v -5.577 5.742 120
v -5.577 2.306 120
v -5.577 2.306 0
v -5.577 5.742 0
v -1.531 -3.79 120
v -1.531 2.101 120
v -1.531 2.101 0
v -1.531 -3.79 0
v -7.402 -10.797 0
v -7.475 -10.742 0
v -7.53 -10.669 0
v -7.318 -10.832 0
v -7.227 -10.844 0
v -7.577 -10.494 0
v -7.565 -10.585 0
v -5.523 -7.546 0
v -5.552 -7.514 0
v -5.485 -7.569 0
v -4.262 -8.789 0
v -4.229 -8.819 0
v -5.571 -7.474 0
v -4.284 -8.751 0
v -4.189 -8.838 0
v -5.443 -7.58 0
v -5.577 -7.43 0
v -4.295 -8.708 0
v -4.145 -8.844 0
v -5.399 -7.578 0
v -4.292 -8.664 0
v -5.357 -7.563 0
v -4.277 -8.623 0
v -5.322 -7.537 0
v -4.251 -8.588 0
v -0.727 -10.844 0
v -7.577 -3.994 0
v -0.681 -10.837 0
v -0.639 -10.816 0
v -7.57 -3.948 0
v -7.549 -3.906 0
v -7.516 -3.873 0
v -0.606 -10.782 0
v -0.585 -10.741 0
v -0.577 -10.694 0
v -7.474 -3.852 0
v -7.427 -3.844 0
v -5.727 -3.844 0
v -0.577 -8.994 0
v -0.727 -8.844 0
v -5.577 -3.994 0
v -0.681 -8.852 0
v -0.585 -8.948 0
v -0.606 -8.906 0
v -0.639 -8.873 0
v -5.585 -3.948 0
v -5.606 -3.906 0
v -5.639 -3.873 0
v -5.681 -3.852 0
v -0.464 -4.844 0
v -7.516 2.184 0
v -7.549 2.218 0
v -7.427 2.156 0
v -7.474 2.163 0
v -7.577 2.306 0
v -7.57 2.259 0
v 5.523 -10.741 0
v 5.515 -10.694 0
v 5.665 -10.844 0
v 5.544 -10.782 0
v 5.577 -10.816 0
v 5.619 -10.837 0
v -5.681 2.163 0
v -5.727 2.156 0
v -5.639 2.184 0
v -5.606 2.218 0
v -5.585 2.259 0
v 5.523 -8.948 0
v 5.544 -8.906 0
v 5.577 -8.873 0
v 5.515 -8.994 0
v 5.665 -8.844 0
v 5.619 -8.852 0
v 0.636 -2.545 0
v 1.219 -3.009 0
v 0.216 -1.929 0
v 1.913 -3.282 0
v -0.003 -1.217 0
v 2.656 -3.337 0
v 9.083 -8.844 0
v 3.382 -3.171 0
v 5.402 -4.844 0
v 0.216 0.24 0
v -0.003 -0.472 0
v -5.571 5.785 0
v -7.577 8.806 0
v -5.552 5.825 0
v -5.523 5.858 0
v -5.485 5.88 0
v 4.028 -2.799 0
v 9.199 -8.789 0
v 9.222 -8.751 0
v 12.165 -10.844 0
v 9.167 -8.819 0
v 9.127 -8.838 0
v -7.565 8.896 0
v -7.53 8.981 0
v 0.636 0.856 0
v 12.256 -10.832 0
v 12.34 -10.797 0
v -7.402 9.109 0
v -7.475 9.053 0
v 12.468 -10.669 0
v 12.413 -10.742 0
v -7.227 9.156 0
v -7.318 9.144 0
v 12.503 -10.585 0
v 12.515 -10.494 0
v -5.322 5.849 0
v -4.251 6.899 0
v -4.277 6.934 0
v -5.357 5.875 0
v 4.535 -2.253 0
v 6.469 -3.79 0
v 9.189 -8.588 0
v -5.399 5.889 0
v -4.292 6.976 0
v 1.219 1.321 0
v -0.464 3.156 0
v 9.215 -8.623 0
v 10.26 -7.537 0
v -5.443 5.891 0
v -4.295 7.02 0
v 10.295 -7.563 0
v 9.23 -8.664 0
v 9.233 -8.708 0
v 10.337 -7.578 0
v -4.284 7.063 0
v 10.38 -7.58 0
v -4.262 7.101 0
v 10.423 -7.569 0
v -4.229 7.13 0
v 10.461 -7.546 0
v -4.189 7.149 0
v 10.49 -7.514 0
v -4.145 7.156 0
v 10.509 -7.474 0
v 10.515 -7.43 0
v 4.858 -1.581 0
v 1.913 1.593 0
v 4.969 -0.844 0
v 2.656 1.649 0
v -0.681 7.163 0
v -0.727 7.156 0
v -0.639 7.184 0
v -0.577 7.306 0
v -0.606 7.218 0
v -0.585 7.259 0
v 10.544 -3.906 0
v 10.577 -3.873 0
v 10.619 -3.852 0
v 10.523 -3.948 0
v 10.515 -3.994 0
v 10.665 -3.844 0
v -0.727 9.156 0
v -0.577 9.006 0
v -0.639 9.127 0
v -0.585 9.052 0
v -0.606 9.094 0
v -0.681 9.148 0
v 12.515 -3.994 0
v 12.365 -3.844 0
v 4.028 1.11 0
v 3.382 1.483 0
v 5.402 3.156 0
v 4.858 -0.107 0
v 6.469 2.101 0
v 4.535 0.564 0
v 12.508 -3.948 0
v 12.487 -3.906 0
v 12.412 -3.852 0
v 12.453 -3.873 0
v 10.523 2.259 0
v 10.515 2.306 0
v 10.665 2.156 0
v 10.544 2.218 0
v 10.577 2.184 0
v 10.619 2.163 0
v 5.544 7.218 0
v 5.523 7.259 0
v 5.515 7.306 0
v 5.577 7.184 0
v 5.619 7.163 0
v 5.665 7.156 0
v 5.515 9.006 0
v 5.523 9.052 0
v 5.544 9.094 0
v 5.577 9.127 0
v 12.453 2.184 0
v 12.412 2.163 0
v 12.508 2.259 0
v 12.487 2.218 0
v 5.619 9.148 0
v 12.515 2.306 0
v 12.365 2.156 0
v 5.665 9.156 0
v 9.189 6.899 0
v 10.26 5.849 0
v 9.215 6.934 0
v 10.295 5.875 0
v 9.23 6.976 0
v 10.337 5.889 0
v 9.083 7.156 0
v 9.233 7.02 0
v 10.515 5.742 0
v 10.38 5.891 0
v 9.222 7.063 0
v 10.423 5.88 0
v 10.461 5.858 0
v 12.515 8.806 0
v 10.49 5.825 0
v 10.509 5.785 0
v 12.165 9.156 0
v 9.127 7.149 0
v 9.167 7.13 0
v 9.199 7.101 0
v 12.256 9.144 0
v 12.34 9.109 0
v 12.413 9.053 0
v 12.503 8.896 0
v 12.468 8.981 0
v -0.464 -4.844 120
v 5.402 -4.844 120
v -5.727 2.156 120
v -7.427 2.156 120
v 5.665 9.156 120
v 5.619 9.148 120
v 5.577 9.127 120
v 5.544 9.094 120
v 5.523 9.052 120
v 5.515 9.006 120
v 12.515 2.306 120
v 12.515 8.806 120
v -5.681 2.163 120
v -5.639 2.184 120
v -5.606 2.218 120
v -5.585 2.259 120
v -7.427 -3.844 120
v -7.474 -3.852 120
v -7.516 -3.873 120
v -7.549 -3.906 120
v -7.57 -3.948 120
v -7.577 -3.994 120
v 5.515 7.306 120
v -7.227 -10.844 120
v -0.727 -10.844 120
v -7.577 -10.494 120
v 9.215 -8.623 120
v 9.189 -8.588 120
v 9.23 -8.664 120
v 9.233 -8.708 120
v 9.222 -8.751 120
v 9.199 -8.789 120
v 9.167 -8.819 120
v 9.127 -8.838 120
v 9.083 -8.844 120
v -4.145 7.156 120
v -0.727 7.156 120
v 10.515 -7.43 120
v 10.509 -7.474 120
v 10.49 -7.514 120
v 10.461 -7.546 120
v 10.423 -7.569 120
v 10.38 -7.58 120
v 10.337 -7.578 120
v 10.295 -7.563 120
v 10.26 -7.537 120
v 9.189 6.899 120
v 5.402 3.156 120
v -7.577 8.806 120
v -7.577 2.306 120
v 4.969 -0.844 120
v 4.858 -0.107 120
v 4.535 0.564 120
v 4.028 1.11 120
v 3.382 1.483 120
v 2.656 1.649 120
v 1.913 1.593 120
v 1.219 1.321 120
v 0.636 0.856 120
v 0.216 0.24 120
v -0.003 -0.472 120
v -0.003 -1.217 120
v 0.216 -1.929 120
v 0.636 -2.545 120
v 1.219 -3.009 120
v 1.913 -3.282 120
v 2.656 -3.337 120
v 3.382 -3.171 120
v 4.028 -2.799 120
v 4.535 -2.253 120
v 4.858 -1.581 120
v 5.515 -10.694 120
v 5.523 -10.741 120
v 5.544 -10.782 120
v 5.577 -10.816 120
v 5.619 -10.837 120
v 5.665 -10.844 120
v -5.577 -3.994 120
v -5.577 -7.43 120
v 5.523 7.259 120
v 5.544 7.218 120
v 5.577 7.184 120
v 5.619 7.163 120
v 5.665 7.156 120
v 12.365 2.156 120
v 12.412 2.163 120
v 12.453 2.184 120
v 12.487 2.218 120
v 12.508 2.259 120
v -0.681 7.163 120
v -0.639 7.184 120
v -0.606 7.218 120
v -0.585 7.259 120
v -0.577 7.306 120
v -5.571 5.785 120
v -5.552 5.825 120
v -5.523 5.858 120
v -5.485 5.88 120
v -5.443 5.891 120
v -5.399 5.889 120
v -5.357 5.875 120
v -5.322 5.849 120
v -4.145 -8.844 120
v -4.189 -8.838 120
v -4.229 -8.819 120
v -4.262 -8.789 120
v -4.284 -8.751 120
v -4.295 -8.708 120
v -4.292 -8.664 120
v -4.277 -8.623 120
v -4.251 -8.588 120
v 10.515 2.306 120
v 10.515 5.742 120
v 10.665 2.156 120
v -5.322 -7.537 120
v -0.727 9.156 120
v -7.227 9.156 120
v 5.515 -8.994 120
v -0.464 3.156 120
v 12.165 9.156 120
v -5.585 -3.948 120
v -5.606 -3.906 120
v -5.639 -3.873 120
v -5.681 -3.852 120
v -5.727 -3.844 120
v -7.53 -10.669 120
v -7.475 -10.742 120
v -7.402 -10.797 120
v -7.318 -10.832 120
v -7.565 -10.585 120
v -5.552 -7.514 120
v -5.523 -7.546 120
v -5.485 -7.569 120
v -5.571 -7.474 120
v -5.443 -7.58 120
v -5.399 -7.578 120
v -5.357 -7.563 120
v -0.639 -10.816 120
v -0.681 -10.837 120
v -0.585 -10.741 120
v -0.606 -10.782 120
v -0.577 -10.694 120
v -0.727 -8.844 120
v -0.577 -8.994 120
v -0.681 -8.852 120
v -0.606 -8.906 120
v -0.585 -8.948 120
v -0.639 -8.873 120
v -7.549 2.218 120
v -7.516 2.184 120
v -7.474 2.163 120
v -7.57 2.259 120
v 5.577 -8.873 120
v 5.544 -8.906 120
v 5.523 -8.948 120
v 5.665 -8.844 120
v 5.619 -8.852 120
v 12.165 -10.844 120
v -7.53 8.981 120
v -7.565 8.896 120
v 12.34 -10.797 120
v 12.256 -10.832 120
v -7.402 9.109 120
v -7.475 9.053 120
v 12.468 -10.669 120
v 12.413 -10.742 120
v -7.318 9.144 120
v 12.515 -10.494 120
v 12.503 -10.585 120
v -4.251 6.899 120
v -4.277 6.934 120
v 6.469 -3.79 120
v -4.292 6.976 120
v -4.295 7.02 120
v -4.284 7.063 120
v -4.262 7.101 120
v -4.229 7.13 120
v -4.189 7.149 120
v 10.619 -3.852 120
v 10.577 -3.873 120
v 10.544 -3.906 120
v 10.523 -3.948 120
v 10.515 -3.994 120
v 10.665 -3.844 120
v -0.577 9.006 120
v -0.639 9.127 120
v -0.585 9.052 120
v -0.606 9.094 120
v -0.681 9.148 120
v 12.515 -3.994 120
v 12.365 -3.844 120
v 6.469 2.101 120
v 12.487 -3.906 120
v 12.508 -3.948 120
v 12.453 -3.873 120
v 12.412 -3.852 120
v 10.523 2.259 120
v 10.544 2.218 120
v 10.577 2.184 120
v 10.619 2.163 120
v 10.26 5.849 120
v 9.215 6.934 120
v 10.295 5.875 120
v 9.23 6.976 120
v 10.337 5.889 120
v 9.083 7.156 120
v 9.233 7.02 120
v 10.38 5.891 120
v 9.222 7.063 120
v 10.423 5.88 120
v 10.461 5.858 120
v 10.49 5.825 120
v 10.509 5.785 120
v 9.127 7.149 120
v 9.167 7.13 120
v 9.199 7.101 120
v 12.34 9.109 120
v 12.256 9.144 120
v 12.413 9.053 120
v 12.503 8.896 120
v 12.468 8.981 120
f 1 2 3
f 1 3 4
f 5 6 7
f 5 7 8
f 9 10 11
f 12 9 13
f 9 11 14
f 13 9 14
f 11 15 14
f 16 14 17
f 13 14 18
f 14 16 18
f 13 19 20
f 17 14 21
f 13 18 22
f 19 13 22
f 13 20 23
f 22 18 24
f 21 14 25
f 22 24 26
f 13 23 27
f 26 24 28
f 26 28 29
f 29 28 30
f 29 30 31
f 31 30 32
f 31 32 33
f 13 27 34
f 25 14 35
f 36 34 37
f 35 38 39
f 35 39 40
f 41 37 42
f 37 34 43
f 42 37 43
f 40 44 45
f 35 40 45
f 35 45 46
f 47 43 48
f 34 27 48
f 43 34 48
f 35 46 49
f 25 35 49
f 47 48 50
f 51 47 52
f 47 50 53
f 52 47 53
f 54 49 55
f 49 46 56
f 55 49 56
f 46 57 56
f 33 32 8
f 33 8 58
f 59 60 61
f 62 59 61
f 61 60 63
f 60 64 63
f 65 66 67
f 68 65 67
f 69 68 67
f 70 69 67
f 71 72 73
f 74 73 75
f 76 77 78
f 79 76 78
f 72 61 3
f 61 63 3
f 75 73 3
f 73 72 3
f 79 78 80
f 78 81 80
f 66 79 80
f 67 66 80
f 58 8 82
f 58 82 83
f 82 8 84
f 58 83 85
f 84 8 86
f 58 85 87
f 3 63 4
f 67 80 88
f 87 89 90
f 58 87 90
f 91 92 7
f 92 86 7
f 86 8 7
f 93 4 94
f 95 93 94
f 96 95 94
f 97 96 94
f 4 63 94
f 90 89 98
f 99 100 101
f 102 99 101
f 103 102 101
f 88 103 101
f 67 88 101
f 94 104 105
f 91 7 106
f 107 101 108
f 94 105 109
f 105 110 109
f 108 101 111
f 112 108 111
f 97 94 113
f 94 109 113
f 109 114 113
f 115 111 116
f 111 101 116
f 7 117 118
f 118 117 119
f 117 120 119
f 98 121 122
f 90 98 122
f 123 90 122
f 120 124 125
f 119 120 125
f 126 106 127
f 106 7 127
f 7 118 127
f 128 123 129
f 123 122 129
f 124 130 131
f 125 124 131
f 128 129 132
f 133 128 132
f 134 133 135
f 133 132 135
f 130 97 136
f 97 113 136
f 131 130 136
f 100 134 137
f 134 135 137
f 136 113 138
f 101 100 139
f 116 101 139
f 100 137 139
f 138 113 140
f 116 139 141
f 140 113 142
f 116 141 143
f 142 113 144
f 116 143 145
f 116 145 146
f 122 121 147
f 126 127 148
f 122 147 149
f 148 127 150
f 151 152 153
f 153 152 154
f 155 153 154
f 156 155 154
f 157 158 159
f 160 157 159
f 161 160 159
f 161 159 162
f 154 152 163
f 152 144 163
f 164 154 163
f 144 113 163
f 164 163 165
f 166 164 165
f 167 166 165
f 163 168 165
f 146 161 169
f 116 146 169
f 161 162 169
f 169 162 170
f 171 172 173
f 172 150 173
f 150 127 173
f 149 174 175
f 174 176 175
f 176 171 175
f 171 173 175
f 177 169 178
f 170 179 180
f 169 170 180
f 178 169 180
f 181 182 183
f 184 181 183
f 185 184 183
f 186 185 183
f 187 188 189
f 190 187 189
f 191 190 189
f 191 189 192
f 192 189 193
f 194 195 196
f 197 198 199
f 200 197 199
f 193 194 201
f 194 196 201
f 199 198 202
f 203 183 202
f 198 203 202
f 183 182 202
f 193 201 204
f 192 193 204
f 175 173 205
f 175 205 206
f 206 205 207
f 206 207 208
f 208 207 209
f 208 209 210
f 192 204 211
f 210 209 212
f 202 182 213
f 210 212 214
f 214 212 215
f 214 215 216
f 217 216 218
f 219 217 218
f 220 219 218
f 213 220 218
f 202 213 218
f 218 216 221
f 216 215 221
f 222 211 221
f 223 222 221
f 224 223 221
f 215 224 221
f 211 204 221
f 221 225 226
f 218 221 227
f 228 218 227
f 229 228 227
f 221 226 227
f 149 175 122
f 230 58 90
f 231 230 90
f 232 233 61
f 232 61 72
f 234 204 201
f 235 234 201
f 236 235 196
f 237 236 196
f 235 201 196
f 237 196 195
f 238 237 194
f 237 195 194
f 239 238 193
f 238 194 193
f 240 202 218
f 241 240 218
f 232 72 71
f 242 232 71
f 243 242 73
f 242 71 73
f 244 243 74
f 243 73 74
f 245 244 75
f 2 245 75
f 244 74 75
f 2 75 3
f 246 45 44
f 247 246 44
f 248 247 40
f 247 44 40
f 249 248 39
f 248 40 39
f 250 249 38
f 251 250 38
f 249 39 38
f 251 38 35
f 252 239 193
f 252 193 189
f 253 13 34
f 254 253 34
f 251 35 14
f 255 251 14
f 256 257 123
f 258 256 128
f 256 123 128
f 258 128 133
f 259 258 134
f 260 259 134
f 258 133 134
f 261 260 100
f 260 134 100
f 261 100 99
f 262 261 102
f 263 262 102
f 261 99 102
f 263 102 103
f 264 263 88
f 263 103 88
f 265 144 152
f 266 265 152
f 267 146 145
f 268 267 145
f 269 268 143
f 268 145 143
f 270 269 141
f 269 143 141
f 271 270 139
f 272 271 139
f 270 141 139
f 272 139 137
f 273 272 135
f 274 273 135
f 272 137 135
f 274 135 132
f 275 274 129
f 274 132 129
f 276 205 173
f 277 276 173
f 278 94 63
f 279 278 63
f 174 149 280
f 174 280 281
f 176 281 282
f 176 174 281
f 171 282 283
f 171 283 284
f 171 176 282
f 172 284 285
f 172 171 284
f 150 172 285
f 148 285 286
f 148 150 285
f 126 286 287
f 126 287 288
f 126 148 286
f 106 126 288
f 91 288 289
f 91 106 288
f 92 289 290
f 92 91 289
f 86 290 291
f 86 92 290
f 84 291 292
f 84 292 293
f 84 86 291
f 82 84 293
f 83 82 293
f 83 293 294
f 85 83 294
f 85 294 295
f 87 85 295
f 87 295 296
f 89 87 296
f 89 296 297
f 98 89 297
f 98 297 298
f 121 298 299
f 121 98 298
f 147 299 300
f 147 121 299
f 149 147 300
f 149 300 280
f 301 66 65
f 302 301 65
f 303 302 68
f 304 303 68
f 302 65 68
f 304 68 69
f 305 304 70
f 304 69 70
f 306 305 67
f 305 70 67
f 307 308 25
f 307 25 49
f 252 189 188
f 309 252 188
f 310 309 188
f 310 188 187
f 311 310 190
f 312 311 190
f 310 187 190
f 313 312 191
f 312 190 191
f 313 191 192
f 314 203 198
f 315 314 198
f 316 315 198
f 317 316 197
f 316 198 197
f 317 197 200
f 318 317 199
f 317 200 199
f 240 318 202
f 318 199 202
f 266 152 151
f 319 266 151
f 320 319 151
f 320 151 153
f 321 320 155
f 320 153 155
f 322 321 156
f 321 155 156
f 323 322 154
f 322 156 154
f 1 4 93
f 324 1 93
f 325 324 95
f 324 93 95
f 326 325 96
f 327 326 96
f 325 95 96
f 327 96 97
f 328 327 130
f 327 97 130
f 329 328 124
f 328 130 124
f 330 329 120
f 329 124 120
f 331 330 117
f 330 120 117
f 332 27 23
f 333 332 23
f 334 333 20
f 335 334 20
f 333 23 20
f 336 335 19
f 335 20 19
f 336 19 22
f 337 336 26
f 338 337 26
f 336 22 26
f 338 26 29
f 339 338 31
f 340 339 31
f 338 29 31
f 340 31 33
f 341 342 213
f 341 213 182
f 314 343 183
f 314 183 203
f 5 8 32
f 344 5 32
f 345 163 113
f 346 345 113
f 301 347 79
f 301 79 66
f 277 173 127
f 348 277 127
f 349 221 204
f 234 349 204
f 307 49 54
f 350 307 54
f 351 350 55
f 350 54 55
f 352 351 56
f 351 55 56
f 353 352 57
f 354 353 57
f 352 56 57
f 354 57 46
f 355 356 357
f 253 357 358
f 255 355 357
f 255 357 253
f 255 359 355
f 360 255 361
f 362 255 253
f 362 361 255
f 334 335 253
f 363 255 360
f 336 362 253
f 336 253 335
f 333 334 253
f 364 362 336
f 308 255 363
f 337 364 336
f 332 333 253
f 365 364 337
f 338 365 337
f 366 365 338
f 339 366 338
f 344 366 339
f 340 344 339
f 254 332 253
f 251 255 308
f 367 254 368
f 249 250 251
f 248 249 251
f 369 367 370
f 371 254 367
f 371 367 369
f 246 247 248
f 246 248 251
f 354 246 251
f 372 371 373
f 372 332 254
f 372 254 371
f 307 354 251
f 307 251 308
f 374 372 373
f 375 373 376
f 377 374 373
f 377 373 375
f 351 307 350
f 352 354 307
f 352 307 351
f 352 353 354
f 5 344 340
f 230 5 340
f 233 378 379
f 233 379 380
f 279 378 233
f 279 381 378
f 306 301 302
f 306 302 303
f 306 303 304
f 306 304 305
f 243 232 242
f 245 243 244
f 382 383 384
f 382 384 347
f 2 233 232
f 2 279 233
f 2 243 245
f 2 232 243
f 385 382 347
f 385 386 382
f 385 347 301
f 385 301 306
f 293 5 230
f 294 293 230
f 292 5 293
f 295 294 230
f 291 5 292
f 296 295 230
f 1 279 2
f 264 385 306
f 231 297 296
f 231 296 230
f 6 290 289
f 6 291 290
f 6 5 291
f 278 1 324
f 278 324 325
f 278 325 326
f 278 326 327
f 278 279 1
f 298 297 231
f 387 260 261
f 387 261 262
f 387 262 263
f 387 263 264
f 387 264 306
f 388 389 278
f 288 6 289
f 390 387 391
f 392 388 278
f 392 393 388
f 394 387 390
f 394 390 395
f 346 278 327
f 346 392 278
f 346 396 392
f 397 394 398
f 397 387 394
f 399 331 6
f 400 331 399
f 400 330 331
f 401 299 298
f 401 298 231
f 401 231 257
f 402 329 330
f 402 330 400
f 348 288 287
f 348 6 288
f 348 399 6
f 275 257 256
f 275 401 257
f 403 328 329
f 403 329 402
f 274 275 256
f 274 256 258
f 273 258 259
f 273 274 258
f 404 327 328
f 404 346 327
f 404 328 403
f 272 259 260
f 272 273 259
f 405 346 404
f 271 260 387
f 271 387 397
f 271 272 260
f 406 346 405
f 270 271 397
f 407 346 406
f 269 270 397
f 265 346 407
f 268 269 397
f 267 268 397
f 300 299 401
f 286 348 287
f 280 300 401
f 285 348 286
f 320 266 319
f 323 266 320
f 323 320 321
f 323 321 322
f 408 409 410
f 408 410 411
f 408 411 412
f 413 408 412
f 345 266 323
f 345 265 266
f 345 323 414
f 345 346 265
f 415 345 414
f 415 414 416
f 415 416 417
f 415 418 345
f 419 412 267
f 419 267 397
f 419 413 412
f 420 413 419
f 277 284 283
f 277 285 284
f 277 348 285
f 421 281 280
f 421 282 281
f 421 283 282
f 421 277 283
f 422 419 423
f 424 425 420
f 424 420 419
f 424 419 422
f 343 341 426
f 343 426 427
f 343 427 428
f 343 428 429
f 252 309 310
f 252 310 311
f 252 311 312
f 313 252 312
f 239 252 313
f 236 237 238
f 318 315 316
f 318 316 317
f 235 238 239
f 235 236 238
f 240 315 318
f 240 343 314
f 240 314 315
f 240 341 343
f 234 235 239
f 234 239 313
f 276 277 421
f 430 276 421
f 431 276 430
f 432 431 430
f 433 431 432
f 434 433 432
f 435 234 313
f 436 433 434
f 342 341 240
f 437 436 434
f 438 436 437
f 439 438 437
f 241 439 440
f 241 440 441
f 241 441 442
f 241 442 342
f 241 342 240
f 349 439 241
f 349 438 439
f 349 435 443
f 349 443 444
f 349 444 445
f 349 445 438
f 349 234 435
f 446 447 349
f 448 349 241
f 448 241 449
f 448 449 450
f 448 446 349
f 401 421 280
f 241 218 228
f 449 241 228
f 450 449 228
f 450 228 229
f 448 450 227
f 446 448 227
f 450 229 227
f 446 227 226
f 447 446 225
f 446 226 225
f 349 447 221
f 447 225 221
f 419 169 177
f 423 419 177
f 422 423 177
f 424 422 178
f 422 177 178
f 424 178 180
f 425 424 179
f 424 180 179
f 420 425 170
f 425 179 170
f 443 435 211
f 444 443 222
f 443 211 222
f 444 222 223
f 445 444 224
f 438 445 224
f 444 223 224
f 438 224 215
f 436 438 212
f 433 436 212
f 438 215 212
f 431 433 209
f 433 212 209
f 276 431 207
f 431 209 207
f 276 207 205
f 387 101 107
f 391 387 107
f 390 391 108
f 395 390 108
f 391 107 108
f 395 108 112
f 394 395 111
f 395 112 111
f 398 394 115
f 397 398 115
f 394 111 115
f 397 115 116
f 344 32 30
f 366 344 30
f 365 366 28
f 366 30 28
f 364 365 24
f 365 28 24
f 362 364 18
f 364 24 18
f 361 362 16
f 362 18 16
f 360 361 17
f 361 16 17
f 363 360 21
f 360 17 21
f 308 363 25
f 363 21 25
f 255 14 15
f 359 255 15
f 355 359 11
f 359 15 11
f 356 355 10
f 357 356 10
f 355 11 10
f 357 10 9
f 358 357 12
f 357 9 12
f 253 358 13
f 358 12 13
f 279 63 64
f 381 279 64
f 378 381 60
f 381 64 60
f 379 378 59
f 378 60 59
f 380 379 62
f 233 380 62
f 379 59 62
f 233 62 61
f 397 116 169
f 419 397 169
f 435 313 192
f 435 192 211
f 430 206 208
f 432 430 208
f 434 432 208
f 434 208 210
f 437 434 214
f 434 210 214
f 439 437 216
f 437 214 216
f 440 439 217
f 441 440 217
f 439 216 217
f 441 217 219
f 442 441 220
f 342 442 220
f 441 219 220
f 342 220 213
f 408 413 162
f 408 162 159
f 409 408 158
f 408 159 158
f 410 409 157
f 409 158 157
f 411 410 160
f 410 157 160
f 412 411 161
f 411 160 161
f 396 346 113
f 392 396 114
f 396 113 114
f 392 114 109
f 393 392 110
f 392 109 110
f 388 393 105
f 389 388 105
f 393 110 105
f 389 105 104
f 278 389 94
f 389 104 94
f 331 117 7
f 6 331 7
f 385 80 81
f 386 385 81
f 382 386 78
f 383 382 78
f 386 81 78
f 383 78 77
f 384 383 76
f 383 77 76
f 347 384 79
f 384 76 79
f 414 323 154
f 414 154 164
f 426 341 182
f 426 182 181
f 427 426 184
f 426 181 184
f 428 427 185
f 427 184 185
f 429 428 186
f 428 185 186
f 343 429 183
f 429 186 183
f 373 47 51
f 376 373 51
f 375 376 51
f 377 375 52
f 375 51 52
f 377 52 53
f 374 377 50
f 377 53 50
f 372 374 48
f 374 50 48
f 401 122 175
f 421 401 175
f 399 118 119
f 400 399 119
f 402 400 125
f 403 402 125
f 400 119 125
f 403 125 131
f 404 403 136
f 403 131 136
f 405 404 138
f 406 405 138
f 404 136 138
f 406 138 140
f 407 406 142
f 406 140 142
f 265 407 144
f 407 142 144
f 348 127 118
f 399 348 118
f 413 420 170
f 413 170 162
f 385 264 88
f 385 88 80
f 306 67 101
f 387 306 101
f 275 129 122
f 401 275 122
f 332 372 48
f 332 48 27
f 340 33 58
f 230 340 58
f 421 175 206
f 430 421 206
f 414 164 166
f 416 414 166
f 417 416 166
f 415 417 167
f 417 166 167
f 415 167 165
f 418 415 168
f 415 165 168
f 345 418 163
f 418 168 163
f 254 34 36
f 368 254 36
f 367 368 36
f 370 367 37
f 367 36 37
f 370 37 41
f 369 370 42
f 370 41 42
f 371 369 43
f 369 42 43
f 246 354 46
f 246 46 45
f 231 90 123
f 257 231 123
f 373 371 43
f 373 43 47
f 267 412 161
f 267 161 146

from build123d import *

# Parameters (mm, degrees)
SKETCH1_R           = 2.5
BOSS_EXTRUDE1_DEPTH = 120


with BuildPart() as part:
    # Sketch1 → Boss-Extrude1 (new body)
    with BuildSketch(Plane.XY):
        with BuildLine():
            Line((-7.427382464, 2.155691805), (-5.727382464, 2.155691805))
            ThreePointArc((-5.727382464, 2.155691805), (-5.621316447, 2.199625788), (-5.577382464, 2.305691805))
            Line((-5.577382464, 2.305691805), (-5.577382464, 5.741876319))
            ThreePointArc((-5.577382464, 5.741876319), (-5.485183419, 5.880292537), (-5.321928469, 5.848550846))
            Line((-5.321928469, 5.848550846), (-1.531086168, 2.101082027))
            Line((-1.531086168, 2.101082027), (-1.531086168, -3.789698417))
            Line((-1.531086168, -3.789698417), (-5.321928469, -7.537167236))
            ThreePointArc((-5.321928469, -7.537167236), (-5.485183419, -7.568908927), (-5.577382464, -7.430492708))
            Line((-5.577382464, -7.430492708), (-5.577382464, -3.994308195))
            ThreePointArc((-5.577382464, -3.994308195), (-5.621316447, -3.888242178), (-5.727382464, -3.844308195))
            Line((-5.727382464, -3.844308195), (-7.427382464, -3.844308195))
            ThreePointArc((-7.427382464, -3.844308195), (-7.533448481, -3.888242178), (-7.577382464, -3.994308195))
            Line((-7.577382464, -3.994308195), (-7.577382464, -10.494308195))
            ThreePointArc((-7.577382464, -10.494308195), (-7.474869837, -10.741795568), (-7.227382464, -10.844308195))
            Line((-7.227382464, -10.844308195), (-0.727382464, -10.844308195))
            ThreePointArc((-0.727382464, -10.844308195), (-0.621316447, -10.800374212), (-0.577382464, -10.694308195))
            Line((-0.577382464, -10.694308195), (-0.577382464, -8.994308195))
            ThreePointArc((-0.577382464, -8.994308195), (-0.621316447, -8.888242178), (-0.727382464, -8.844308195))
            Line((-0.727382464, -8.844308195), (-4.145467261, -8.844308195))
            ThreePointArc((-4.145467261, -8.844308195), (-4.284213755, -8.751311795), (-4.250921257, -8.587633667))
            Line((-4.250921257, -8.587633667), (-0.464270258, -4.844308195))
            Line((-0.464270258, -4.844308195), (5.402097922, -4.844308195))
            Line((5.402097922, -4.844308195), (9.188748921, -8.587633667))
            ThreePointArc((9.188748921, -8.587633667), (9.22204142, -8.751311795), (9.083294926, -8.844308195))
            Line((9.083294926, -8.844308195), (5.665210129, -8.844308195))
            ThreePointArc((5.665210129, -8.844308195), (5.559144111, -8.888242178), (5.515210129, -8.994308195))
            Line((5.515210129, -8.994308195), (5.515210129, -10.694308195))
            ThreePointArc((5.515210129, -10.694308195), (5.559144111, -10.800374212), (5.665210129, -10.844308195))
            Line((5.665210129, -10.844308195), (12.165210129, -10.844308195))
            ThreePointArc((12.165210129, -10.844308195), (12.412697502, -10.741795568), (12.515210129, -10.494308195))
            Line((12.515210129, -10.494308195), (12.515210129, -3.994308195))
            ThreePointArc((12.515210129, -3.994308195), (12.471276146, -3.888242178), (12.365210129, -3.844308195))
            Line((12.365210129, -3.844308195), (10.665210129, -3.844308195))
            ThreePointArc((10.665210129, -3.844308195), (10.559144111, -3.888242178), (10.515210129, -3.994308195))
            Line((10.515210129, -3.994308195), (10.515210129, -7.430492708))
            ThreePointArc((10.515210129, -7.430492708), (10.423011083, -7.568908927), (10.259756133, -7.537167236))
            Line((10.259756133, -7.537167236), (6.468913832, -3.789698417))
            Line((6.468913832, -3.789698417), (6.468913832, 2.101082027))
            Line((6.468913832, 2.101082027), (10.259756133, 5.848550846))
            ThreePointArc((10.259756133, 5.848550846), (10.423011083, 5.880292537), (10.515210129, 5.741876319))
            Line((10.515210129, 5.741876319), (10.515210129, 2.305691805))
            ThreePointArc((10.515210129, 2.305691805), (10.559144111, 2.199625788), (10.665210129, 2.155691805))
            Line((10.665210129, 2.155691805), (12.365210129, 2.155691805))
            ThreePointArc((12.365210129, 2.155691805), (12.471276146, 2.199625788), (12.515210129, 2.305691805))
            Line((12.515210129, 2.305691805), (12.515210129, 8.805691805))
            ThreePointArc((12.515210129, 8.805691805), (12.412697502, 9.053179179), (12.165210129, 9.155691805))
            Line((12.165210129, 9.155691805), (5.665210129, 9.155691805))
            ThreePointArc((5.665210129, 9.155691805), (5.559144111, 9.111757822), (5.515210129, 9.005691805))
            Line((5.515210129, 9.005691805), (5.515210129, 7.305691805))
            ThreePointArc((5.515210129, 7.305691805), (5.559144111, 7.199625788), (5.665210129, 7.155691805))
            Line((5.665210129, 7.155691805), (9.083294926, 7.155691805))
            ThreePointArc((9.083294926, 7.155691805), (9.22204142, 7.062695405), (9.188748921, 6.899017277))
            Line((9.188748921, 6.899017277), (5.402097922, 3.155691805))
            Line((5.402097922, 3.155691805), (-0.464270258, 3.155691805))
            Line((-0.464270258, 3.155691805), (-4.250921257, 6.899017277))
            ThreePointArc((-4.250921257, 6.899017277), (-4.284213755, 7.062695405), (-4.145467261, 7.155691805))
            Line((-4.145467261, 7.155691805), (-0.727382464, 7.155691805))
            ThreePointArc((-0.727382464, 7.155691805), (-0.621316447, 7.199625788), (-0.577382464, 7.305691805))
            Line((-0.577382464, 7.305691805), (-0.577382464, 9.005691805))
            ThreePointArc((-0.577382464, 9.005691805), (-0.621316447, 9.111757822), (-0.727382464, 9.155691805))
            Line((-0.727382464, 9.155691805), (-7.227382464, 9.155691805))
            ThreePointArc((-7.227382464, 9.155691805), (-7.474869837, 9.053179179), (-7.577382464, 8.805691805))
            Line((-7.577382464, 8.805691805), (-7.577382464, 2.305691805))
            ThreePointArc((-7.577382464, 2.305691805), (-7.533448481, 2.199625788), (-7.427382464, 2.155691805))
        make_face()
        with Locations((2.468913832, -0.844308195)):
            Circle(SKETCH1_R, mode=Mode.SUBTRACT)
    extrude(amount=BOSS_EXTRUDE1_DEPTH)


solid = part.part
